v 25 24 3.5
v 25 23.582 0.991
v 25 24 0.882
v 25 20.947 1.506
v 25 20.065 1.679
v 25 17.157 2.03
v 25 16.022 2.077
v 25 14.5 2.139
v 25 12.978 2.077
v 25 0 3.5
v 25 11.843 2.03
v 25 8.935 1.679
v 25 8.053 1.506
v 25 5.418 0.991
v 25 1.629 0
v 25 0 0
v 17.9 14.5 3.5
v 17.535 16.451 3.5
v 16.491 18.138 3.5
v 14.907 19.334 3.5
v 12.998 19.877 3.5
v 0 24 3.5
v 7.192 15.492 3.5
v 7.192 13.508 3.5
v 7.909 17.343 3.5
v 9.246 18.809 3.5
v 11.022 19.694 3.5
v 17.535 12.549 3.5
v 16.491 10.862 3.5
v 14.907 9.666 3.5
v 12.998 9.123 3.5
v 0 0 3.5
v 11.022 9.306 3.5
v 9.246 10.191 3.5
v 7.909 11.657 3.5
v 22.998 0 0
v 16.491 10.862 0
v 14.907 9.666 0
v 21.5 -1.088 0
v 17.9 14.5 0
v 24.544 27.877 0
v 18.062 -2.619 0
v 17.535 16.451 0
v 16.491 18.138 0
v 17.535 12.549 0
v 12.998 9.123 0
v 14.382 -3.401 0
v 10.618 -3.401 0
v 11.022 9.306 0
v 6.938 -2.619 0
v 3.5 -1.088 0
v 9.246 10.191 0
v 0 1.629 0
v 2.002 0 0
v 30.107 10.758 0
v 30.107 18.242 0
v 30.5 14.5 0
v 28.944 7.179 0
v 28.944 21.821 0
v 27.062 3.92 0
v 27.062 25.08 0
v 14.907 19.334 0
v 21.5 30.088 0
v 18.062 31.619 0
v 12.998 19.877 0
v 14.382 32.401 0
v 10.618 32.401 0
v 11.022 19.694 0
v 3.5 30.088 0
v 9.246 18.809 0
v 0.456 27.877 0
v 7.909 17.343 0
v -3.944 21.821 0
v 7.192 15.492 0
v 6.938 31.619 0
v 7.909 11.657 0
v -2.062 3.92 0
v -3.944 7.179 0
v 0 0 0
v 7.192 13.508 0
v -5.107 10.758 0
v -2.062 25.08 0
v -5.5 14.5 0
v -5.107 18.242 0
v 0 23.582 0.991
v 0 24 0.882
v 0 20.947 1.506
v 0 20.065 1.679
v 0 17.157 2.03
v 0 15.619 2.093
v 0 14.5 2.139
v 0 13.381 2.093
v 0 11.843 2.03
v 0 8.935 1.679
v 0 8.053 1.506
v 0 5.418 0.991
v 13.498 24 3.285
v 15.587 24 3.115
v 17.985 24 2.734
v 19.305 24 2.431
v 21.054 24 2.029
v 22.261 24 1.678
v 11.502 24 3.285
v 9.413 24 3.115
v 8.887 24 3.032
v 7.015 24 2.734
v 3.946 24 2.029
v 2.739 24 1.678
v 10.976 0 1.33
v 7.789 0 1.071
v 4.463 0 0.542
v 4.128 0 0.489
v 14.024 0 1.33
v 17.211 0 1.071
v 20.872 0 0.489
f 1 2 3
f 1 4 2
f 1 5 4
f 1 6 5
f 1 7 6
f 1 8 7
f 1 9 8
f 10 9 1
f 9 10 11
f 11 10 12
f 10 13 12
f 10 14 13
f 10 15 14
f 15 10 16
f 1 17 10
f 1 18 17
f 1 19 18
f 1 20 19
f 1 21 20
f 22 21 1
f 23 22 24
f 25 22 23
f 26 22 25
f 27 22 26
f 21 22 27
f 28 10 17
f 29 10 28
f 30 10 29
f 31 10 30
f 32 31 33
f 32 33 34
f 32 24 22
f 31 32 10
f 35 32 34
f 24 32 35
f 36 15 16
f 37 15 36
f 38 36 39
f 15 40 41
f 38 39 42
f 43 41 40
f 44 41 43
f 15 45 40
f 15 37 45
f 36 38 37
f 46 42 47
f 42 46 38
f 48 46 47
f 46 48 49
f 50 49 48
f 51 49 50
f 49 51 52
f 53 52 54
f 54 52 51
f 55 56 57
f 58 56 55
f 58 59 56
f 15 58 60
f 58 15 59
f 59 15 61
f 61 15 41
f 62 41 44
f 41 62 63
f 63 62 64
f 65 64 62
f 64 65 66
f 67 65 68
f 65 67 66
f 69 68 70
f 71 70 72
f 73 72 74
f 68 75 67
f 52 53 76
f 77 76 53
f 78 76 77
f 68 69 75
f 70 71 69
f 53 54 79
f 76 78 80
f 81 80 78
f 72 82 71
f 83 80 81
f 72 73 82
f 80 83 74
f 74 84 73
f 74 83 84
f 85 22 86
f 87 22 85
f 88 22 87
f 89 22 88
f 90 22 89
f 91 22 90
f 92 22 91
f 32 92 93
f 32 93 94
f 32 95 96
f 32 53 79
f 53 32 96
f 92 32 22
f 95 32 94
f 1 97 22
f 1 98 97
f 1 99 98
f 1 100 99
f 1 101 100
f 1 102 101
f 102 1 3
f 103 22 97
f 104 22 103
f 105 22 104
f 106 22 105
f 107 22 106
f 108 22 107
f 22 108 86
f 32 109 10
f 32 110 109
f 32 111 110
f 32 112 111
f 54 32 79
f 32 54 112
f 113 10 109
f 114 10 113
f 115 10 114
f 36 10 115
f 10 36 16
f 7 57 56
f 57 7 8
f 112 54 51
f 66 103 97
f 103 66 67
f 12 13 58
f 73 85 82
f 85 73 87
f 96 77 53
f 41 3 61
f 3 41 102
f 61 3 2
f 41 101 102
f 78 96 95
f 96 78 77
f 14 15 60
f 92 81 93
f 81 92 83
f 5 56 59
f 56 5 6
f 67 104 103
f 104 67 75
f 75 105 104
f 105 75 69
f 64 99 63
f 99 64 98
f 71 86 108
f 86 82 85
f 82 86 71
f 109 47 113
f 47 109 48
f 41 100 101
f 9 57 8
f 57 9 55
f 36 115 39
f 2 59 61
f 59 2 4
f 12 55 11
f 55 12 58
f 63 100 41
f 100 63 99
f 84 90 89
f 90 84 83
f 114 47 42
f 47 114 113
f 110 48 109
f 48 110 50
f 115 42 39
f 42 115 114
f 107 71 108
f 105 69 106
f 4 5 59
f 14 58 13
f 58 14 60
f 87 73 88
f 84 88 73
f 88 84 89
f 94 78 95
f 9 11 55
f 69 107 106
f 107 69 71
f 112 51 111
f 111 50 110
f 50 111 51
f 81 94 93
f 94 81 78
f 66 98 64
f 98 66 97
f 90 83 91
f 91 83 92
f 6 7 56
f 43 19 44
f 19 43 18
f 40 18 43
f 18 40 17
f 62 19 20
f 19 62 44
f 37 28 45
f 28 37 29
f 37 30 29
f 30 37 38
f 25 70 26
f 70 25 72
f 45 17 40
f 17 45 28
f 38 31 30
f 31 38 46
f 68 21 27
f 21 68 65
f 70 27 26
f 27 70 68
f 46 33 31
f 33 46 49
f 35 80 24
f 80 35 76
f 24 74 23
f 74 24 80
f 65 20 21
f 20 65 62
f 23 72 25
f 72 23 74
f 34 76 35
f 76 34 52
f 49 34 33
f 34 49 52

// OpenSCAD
depth = 3.5;
hole_r = 1.4;
kogeto_r_min = 5.4;
kogeto_r_max = 36/2;

difference()
{
	baseblock();
	translate([25/2, 14.5, -0.1]) cylinder(r=kogeto_r_min,h=depth+1);
}

module baseblock()
{
	cube([25,24,depth]);
	translate([25/2, 14.5, 0]) cylinder(r2=kogeto_r_max-9, r1=kogeto_r_max, h=depth);
}
